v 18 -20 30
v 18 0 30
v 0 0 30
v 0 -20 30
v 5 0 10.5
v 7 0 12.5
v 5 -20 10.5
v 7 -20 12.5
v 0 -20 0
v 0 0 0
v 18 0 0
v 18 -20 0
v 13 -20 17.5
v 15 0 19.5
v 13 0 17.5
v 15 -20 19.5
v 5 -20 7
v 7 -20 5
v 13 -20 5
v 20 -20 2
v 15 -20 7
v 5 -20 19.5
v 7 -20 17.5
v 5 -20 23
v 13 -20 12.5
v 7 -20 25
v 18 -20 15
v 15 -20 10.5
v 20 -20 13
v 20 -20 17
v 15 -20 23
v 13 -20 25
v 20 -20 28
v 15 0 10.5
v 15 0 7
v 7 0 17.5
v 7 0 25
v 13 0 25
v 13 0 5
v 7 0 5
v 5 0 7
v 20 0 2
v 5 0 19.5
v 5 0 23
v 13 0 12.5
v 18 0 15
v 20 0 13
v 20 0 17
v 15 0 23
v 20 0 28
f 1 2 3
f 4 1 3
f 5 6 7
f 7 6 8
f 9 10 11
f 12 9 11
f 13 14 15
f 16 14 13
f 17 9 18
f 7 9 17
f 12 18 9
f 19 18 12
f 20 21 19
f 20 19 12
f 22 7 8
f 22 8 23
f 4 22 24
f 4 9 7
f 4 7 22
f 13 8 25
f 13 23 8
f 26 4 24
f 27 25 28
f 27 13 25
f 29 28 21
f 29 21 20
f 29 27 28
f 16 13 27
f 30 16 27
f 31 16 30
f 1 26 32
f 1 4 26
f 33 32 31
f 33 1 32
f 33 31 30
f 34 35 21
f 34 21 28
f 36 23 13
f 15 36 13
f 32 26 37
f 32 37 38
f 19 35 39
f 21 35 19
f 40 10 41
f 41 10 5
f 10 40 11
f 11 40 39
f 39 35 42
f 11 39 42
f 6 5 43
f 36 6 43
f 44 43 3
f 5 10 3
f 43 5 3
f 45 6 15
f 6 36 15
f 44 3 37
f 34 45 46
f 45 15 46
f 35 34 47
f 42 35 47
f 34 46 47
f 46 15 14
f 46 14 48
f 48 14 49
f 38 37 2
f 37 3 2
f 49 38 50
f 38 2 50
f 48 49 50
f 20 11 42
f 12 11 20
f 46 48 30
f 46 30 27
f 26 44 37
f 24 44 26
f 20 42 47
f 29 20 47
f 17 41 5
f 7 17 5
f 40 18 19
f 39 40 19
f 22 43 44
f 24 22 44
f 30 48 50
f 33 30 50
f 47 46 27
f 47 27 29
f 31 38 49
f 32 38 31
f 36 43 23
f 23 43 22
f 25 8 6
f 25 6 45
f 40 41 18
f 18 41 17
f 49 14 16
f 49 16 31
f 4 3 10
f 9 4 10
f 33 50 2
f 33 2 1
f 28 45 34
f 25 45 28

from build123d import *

# Parameters (mm, degrees)
F0_W     = 10
F0_H     = 7.5
F1_DEPTH = 20
F2_SIZE  = 2
F4_DEPTH = 25


# Not quite as in the source:
# - a feature names something its author has since deleted; it is built from what else it names


with BuildPart() as f1:
    # F0 (on Front) → F1 (new body)
    with BuildSketch(Plane.XZ):
        Polygon((20, 30), (0, 30), (0, 0), (20, 0), (20, 15), align=None)
        with Locations((10, 8.75)):
            Rectangle(F0_W, F0_H, mode=Mode.SUBTRACT)
        with Locations((10, 21.25)):
            Rectangle(F0_W, F0_H, mode=Mode.SUBTRACT)
    extrude(amount=F1_DEPTH)

    # F2
    f2_edges = [f1.edges().sort_by_distance(p)[0] for p in [
        (20, -10, 30),
        (5, -10, 17.5),
        (5, -10, 25),
        (5, -10, 12.5),
        (5, -10, 5),
        (15, -10, 25),
        (15, -10, 17.5),
        (15, -10, 12.5),
        (15, -10, 5),
        (20, -10, 0),
    ]]
    chamfer(f2_edges, length=F2_SIZE)

    # F3 (on face) → F4 (cut)
    with BuildSketch(Plane.XZ.offset(20)):
        Polygon((20, 13), (20, 15), (18, 15), align=None)
        Polygon((18, 15), (20, 15), (20, 17), align=None)
    extrude(amount=-F4_DEPTH, mode=Mode.SUBTRACT)


solid = f1.part
